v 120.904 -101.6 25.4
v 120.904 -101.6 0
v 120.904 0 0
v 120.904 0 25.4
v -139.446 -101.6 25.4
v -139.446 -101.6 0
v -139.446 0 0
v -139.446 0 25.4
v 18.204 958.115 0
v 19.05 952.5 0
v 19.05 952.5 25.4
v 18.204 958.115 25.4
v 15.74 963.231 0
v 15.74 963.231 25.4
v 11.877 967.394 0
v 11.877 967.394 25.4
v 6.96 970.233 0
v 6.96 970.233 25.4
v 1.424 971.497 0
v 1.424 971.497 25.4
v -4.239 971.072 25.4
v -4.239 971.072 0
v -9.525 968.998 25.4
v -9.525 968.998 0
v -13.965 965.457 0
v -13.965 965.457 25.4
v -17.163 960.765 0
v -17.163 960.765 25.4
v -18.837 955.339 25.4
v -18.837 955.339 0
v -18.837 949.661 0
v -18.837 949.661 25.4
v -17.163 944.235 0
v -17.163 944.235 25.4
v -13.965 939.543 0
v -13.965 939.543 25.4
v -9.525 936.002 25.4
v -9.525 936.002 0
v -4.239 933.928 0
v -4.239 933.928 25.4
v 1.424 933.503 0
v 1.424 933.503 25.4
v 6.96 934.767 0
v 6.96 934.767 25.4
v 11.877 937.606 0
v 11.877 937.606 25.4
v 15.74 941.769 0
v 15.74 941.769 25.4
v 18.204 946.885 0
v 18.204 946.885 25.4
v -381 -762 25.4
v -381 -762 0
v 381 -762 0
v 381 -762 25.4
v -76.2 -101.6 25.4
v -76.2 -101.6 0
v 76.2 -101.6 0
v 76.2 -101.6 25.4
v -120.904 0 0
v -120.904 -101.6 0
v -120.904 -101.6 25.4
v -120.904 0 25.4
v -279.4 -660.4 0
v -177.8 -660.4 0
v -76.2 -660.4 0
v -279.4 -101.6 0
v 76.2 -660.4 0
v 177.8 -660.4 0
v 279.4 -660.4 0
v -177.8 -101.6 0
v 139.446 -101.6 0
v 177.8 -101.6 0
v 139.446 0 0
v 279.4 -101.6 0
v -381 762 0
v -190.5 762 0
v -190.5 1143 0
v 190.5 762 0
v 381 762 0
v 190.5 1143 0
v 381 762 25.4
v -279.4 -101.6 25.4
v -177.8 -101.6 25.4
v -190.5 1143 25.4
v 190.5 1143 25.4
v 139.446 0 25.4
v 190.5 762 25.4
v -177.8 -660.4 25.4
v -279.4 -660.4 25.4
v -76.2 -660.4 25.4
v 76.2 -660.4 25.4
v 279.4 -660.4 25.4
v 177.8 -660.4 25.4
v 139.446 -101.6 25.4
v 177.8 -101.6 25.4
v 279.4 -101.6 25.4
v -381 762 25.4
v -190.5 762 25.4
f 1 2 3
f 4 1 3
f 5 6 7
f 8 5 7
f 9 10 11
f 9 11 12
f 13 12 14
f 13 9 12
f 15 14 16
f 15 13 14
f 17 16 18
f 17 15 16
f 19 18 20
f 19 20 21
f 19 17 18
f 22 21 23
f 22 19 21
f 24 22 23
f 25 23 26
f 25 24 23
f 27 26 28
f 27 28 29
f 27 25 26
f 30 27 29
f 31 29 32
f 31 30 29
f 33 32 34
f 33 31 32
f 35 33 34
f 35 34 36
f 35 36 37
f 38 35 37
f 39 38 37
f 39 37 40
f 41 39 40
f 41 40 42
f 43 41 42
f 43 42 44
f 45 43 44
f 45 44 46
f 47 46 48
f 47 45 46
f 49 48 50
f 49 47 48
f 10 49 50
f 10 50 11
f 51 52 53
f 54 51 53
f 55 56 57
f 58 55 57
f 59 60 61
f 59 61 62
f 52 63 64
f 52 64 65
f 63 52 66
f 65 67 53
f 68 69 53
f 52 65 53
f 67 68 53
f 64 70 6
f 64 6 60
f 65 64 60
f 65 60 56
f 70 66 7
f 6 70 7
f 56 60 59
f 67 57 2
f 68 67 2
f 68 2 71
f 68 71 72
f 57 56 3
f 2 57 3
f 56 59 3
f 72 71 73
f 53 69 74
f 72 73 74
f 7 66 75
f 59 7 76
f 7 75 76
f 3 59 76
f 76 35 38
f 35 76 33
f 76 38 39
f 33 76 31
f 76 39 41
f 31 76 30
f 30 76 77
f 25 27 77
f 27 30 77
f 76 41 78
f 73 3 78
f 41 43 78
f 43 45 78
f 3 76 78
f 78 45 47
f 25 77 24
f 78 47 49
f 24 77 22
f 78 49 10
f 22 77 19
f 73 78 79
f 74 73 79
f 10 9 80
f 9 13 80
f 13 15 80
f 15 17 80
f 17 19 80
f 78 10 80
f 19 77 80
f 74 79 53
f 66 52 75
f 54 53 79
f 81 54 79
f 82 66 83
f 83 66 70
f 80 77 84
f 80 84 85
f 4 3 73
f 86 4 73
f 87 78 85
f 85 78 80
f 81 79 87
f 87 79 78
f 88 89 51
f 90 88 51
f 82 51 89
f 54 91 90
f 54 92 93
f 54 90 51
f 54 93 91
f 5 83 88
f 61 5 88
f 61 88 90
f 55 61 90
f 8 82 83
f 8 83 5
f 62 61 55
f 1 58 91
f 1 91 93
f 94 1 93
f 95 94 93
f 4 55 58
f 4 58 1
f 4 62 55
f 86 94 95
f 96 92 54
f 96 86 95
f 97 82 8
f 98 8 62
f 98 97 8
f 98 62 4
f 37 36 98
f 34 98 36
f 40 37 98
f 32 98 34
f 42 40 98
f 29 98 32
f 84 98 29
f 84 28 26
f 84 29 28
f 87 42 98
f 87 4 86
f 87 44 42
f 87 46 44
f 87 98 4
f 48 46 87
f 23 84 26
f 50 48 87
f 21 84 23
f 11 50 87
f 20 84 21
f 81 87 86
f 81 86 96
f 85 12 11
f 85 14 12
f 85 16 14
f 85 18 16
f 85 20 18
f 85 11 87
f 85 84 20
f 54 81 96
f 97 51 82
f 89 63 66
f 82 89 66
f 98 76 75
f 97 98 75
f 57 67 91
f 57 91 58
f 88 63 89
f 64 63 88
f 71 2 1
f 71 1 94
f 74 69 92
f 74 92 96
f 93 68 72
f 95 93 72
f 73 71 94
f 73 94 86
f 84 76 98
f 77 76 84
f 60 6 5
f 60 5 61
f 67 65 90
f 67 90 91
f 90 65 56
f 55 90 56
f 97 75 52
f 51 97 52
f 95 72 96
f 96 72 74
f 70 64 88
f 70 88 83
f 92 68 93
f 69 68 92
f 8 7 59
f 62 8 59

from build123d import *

# Parameters (mm, degrees)
F0_W     = 101.6
F0_H     = 558.8
F0_W_2   = 18.542
F0_H_2   = 101.6
F0_W_3   = 152.4
F0_W_4   = 381
F0_H_3   = 381
F0_R     = 19.05
F1_DEPTH = 25.4


with BuildPart() as f1:
    # F0 (on Top) → F1 (new body)
    with BuildSketch(Plane.XY):
        Polygon((381, -762), (381, 762), (190.5, 762), (-190.5, 762), (-381, 762), (-381, -762), align=None)
        with Locations((-228.6, -381)):
            Rectangle(F0_W, F0_H, mode=Mode.SUBTRACT)
        with Locations((-130.175, -50.8)):
            Rectangle(F0_W_2, F0_H_2, mode=Mode.SUBTRACT)
        with Locations((0, -381)):
            Rectangle(F0_W_3, F0_H, mode=Mode.SUBTRACT)
        with Locations((228.6, -381)):
            Rectangle(F0_W, F0_H, mode=Mode.SUBTRACT)
        with Locations((130.175, -50.8)):
            Rectangle(F0_W_2, F0_H_2, mode=Mode.SUBTRACT)
        with Locations((0, 952.5)):
            Rectangle(F0_W_4, F0_H_3)
        with Locations((0, 952.5)):
            Circle(F0_R, mode=Mode.SUBTRACT)
    extrude(amount=F1_DEPTH)


solid = f1.part
